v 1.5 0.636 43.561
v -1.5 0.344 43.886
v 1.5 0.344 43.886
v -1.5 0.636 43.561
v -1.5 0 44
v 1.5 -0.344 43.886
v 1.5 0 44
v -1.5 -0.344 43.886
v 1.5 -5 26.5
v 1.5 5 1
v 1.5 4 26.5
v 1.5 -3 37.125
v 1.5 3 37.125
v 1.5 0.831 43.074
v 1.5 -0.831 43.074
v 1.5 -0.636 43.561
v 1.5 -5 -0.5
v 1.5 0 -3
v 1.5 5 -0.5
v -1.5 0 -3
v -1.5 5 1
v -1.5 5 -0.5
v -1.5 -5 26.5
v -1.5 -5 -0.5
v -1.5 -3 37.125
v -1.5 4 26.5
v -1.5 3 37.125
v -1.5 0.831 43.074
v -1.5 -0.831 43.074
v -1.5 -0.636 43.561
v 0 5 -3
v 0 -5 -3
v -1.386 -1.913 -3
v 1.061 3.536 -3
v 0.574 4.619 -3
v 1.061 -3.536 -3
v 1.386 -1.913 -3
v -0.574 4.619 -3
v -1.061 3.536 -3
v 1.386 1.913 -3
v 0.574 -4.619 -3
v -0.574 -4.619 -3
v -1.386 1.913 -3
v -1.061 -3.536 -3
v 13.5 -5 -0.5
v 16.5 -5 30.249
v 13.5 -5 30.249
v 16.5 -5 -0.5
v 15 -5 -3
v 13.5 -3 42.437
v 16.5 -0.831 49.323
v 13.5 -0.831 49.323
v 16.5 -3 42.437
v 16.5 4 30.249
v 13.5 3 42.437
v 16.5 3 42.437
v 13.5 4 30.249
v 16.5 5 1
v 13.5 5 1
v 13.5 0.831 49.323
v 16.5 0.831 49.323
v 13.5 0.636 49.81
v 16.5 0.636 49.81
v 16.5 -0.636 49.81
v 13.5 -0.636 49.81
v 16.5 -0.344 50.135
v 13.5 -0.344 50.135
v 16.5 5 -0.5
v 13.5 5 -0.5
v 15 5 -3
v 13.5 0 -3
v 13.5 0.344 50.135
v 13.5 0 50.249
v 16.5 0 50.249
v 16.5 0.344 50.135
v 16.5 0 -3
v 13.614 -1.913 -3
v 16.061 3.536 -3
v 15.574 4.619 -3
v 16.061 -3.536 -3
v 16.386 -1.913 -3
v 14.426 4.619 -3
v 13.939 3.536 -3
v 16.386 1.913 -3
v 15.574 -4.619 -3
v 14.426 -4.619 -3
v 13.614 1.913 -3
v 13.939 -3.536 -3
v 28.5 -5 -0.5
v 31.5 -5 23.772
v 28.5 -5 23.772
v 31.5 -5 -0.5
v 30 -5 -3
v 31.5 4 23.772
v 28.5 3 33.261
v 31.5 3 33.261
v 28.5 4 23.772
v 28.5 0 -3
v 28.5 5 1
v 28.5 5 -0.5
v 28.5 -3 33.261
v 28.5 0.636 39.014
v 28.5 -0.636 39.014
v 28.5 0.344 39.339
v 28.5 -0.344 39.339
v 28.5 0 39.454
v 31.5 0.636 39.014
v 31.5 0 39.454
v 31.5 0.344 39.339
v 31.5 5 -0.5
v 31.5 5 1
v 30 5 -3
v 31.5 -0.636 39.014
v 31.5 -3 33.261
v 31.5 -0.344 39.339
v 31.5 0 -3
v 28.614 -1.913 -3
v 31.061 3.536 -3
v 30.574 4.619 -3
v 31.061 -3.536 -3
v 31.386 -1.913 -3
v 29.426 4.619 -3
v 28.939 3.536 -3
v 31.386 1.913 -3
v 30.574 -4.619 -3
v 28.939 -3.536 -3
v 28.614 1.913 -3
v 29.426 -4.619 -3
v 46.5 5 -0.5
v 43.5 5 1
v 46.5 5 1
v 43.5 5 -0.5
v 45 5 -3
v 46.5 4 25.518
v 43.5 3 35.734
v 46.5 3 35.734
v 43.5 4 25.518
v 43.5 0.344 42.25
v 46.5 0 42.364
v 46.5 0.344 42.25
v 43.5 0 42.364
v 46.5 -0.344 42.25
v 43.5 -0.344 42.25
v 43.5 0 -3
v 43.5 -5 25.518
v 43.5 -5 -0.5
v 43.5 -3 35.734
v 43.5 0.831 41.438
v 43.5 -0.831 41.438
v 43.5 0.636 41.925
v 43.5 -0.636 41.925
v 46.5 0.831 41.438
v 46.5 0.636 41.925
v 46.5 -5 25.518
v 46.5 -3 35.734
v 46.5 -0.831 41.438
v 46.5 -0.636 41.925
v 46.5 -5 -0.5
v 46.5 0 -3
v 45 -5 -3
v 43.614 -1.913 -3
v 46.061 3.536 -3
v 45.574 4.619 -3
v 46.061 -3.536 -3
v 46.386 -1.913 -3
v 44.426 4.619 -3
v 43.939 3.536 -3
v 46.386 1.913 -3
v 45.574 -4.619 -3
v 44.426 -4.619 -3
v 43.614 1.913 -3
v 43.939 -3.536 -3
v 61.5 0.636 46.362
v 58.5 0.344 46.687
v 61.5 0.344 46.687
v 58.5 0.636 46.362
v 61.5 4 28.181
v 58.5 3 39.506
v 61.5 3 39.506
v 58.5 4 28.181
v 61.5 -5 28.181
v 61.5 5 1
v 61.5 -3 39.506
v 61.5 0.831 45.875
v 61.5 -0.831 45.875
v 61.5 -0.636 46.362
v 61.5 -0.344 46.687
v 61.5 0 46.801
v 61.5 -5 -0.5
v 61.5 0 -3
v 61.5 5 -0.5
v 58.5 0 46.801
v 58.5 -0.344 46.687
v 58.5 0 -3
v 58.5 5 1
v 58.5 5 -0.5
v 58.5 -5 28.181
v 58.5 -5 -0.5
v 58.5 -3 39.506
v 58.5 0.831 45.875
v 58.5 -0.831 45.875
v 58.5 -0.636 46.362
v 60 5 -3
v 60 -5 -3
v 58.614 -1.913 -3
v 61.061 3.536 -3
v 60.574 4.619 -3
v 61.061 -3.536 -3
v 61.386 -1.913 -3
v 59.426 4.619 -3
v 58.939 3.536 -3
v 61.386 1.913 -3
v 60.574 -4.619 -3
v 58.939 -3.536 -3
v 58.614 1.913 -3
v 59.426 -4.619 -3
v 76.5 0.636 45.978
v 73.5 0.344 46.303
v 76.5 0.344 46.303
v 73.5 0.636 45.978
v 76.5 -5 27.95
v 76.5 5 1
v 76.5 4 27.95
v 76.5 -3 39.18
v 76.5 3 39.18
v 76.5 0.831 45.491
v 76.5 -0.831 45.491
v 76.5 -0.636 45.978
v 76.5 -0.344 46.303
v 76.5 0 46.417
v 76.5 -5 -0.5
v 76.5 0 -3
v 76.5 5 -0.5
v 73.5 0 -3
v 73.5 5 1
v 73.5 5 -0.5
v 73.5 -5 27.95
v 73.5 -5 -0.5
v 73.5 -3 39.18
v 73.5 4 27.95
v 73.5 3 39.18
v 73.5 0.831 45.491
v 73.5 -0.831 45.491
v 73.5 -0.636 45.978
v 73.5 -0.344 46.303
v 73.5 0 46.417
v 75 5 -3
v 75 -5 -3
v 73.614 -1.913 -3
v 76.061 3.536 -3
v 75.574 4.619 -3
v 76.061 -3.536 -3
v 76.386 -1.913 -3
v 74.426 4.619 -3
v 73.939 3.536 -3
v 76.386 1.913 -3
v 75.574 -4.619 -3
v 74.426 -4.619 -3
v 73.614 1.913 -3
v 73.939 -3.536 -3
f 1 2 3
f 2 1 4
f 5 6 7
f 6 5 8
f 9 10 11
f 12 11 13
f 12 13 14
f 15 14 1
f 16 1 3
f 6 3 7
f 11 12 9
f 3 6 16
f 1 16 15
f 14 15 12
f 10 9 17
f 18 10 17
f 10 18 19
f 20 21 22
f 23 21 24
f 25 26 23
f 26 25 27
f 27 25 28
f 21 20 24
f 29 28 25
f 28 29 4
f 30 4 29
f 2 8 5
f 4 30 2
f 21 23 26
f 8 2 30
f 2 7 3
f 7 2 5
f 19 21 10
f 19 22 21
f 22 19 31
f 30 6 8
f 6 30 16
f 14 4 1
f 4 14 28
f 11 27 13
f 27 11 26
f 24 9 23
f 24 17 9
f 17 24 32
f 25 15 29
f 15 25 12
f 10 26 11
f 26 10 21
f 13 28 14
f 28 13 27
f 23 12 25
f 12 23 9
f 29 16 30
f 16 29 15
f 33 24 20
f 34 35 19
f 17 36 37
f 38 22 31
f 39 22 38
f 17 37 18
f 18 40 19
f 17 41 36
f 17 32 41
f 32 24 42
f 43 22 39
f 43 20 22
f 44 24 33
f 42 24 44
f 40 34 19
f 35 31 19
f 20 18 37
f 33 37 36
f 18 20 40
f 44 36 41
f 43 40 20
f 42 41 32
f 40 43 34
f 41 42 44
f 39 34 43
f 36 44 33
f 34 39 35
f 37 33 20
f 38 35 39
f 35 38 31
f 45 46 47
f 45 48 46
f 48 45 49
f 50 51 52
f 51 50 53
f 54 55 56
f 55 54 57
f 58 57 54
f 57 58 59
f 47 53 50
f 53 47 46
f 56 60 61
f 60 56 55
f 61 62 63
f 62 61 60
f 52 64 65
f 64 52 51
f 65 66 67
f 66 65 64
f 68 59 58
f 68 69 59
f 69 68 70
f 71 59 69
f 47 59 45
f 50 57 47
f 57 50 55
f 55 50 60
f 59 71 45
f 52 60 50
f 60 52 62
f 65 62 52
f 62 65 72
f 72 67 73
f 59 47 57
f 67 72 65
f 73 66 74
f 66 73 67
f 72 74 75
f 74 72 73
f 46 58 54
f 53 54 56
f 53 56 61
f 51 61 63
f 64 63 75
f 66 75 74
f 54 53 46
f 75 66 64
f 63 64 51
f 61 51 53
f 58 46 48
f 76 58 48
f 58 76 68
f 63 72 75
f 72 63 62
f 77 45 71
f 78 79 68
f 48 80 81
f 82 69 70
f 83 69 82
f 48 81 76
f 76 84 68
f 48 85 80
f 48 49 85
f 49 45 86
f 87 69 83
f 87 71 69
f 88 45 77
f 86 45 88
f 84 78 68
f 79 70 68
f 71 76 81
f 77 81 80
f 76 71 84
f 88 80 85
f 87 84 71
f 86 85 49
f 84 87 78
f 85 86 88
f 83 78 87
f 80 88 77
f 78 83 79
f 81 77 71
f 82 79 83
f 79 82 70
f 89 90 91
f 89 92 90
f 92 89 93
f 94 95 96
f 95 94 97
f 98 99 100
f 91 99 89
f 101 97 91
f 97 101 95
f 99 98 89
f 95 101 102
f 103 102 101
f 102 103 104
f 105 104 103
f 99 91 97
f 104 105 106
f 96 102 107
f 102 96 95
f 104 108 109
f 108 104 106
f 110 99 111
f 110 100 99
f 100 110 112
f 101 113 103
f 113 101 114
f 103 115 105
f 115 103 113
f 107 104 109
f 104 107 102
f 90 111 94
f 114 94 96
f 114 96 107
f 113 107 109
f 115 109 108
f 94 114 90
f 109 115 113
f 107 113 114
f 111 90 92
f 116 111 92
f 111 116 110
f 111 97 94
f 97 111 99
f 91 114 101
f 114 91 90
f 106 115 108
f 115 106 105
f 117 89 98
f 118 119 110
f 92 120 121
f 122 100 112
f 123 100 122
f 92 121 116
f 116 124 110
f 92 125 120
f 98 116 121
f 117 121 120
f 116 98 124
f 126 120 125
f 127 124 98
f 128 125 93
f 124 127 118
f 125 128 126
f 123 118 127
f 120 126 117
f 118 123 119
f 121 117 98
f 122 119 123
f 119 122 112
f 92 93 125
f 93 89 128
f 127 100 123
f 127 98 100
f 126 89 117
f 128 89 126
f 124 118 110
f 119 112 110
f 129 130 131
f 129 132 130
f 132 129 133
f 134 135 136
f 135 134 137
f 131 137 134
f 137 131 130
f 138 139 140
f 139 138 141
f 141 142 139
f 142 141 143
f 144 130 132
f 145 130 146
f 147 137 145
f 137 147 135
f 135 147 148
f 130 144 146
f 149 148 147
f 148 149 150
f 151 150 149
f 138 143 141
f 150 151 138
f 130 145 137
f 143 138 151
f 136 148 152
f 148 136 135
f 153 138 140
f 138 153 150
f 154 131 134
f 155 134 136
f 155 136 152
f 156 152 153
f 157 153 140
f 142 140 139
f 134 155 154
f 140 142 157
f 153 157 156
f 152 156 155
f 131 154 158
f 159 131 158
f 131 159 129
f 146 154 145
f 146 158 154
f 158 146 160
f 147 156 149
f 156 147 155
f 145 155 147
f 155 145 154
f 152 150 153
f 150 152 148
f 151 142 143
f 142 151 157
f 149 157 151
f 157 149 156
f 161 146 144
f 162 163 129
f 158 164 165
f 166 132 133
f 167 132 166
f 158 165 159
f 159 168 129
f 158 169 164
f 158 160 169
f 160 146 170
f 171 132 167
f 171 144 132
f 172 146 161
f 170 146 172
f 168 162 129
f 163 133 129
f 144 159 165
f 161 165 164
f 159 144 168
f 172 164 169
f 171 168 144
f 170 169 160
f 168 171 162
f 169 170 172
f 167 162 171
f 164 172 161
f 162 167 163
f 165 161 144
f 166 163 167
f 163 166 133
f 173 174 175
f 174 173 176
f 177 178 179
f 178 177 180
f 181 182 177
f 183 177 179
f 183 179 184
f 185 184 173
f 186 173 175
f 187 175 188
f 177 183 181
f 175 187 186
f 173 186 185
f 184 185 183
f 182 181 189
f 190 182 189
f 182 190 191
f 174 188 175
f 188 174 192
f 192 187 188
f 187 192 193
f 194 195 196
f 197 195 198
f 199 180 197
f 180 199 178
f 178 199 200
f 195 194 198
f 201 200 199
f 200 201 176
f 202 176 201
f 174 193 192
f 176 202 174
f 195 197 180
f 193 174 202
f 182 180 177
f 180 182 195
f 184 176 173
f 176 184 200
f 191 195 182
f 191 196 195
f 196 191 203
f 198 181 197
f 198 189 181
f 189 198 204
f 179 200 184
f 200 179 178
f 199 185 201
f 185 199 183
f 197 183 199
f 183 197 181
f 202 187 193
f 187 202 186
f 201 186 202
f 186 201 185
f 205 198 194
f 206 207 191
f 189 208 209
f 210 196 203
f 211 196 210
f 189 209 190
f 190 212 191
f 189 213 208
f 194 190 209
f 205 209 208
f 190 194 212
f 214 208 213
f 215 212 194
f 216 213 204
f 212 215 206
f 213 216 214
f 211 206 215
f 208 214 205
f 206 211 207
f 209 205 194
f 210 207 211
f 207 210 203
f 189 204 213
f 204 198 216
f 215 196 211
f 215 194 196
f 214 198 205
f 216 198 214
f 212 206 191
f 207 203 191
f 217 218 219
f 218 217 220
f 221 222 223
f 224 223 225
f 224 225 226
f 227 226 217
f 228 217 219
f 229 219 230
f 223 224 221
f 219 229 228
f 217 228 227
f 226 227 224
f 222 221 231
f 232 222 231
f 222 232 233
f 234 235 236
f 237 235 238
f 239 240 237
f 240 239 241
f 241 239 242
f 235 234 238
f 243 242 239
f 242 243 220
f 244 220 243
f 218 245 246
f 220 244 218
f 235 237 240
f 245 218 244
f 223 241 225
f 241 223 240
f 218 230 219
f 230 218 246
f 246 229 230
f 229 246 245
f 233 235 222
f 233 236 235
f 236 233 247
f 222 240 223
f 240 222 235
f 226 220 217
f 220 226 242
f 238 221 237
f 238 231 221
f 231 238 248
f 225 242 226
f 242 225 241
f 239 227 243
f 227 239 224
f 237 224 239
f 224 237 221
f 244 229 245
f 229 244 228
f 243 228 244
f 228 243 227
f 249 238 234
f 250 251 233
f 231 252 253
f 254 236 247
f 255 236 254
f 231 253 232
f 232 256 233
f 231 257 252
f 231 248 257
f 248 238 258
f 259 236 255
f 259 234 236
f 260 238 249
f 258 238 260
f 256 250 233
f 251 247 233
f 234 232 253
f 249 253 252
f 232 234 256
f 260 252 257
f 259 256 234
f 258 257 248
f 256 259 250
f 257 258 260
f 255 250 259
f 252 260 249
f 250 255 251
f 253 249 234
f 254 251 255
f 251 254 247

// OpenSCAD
// file: ../common.scad
/*
 * WAVE OCEAN - Y-AXIS BARREL CAM SYSTEM
 * CORRECT GEOMETRY FOR TRAVELING WAVE
 *
 * COORDINATE SYSTEM:
 * - X: Along slat row (left-right) - WAVE TRAVELS THIS DIRECTION
 * - Y: Front-back (viewer at -Y) - CAM SHAFT AXIS
 * - Z: Up-down (gravity in -Z)
 *
 * KEY INSIGHT:
 * For a traveling wave, the cam shaft must be PERPENDICULAR to the slat row.
 * Shaft along Y-axis, slats along X-axis.
 * As cam rotates around Y, the helical ridge peak travels along X.
 *
 * All dimensions in mm
 */

// ============================================
// PRINT TOLERANCES
// ============================================

TOL_CLEARANCE = 0.2;
TOL_SLIDING = 0.3;

// ============================================
// HARDWARE
// ============================================

// 608 Bearing
BEARING_608_ID = 8;
BEARING_608_OD = 22;
BEARING_608_H = 7;

// Shaft (along Y-axis)
SHAFT_DIA = 8;
SHAFT_HOLE = SHAFT_DIA + TOL_CLEARANCE;

// ============================================
// SLAT CONFIGURATION
// ============================================

// Slat dimensions
SLAT_THICKNESS = 3;           // X dimension
SLAT_DEPTH = 10;              // Y dimension
SLAT_BASE_HEIGHT = 35;        // Z - minimum height
SLAT_HEIGHT_VAR = 15;         // Height variation

// Spacing
SLAT_SPACING = 5;             // Center-to-center along X
NUM_SLATS = 36;               // Per layer
SLAT_ROW_LENGTH = NUM_SLATS * SLAT_SPACING;  // 180mm

// Height variation using golden ratio
GOLDEN_ANGLE = 137.5077;
function slat_height(i) =
    let(
        primary = sin(i * GOLDEN_ANGLE),
        secondary = sin(i * GOLDEN_ANGLE * 0.618) * 0.4,
        combined = (primary + secondary + 1.4) / 2.8
    )
    SLAT_BASE_HEIGHT + SLAT_HEIGHT_VAR * combined;

// Slat X position (centered)
function slat_x(i) = (i - (NUM_SLATS - 1) / 2) * SLAT_SPACING;

// ============================================
// LAYER CONFIGURATION
// ============================================

NUM_LAYERS = 3;
LAYER_SPACING = 12;           // Y spacing between layers

// Layer Y positions (front to back)
LAYER_Y = [
    -LAYER_SPACING,           // Layer 0 (front): Y = -12
    0,                        // Layer 1 (mid):   Y = 0
    LAYER_SPACING             // Layer 2 (back):  Y = +12
];

// Ridge heights per layer (different amplitudes)
LAYER_RIDGE_HEIGHT = [4, 7, 10];  // Front=small, Mid=medium, Back=large

// Layer colors (front=dark, back=light for depth)
LAYER_COLORS = [
    [0.08, 0.25, 0.50],       // Dark blue (front)
    [0.15, 0.40, 0.65],       // Medium blue
    [0.25, 0.55, 0.80]        // Light blue (back)
];

// ============================================
// CAM CONFIGURATION
// ============================================

// Cam extends along X (same length as slat row)
CAM_LENGTH = SLAT_ROW_LENGTH;  // 180mm along X
CAM_CORE_RADIUS = 15;          // Minimum radius
CAM_WIDTH = 10;                // Y dimension of each cam section

// Helix: number of complete waves visible
HELIX_TURNS = 2;

// Maximum radius (core + largest ridge)
CAM_MAX_RADIUS = CAM_CORE_RADIUS + max(LAYER_RIDGE_HEIGHT);  // 25mm

// ============================================
// CAM SURFACE CALCULATION
// ============================================

// The key formula for traveling wave:
// At position X along cam, the phase depends on X.
// As cam rotates (theta increases), the "peak" of the wave travels along X.

function cam_surface_z(x, layer, theta) =
    let(
        // Helix angle at this X position
        helix_angle = (x / CAM_LENGTH + 0.5) * 360 * HELIX_TURNS,
        // Effective angle (theta - helix creates traveling effect)
        effective_angle = theta - helix_angle,
        // Ridge height for this layer
        ridge = LAYER_RIDGE_HEIGHT[layer],
        // Cam surface: cosine wave
        surface = CAM_CORE_RADIUS + ridge * (0.5 + 0.5 * cos(effective_angle))
    )
    surface;

// ============================================
// SLAT Z POSITION
// ============================================

FOLLOWER_HEIGHT = 3;          // Height of follower pad
CAM_CENTER_Z = 30;            // Height of cam shaft axis

function slat_z(i, layer, theta) =
    let(
        x = slat_x(i),
        cam_top = cam_surface_z(x, layer, theta)
    )
    CAM_CENTER_Z + cam_top + FOLLOWER_HEIGHT;

// ============================================
// ASSEMBLY POSITIONS
// ============================================

// Bearing mounts at front and back of cam stack
MOUNT_Y_FRONT = LAYER_Y[0] - CAM_WIDTH/2 - 15;   // ~-27
MOUNT_Y_BACK = LAYER_Y[2] + CAM_WIDTH/2 + 15;    // ~+27

// Shaft length
SHAFT_LENGTH = MOUNT_Y_BACK - MOUNT_Y_FRONT + 60;  // Extra for motor

// ============================================
// COLORS
// ============================================

C_CAM = [0.65, 0.5, 0.3];
C_SHAFT = [0.6, 0.6, 0.65];
C_MOUNT = [0.3, 0.3, 0.35];
C_FRAME = [0.25, 0.25, 0.28];

// ============================================
// QUALITY
// ============================================

$fn = 48;

// ============================================
// VERIFICATION OUTPUT
// ============================================

echo("============================================");
echo("  Y-AXIS BARREL CAM - TRAVELING WAVE");
echo("============================================");
echo("");
echo("GEOMETRY:");
echo(str("  Slat row along X: ", SLAT_ROW_LENGTH, "mm"));
echo(str("  Slats per layer: ", NUM_SLATS));
echo(str("  Layers: ", NUM_LAYERS, " at Y = ", LAYER_Y));
echo("");
echo("CAM:");
echo(str("  Shaft axis: Y (perpendicular to slat row)"));
echo(str("  Cam length: ", CAM_LENGTH, "mm along X"));
echo(str("  Core radius: ", CAM_CORE_RADIUS, "mm"));
echo(str("  Ridge heights: ", LAYER_RIDGE_HEIGHT, "mm"));
echo(str("  Helix turns: ", HELIX_TURNS, " = ", HELIX_TURNS, " waves visible"));
echo("");
echo("WAVE BEHAVIOR:");
echo("  As cam rotates around Y, the peak travels along X.");
echo("  This creates a TRUE traveling wave effect.");
// main file
/*
 * SLAT - Vertical Wave Element with Bottom Follower
 *
 * DESIGN:
 * - Thin vertical body
 * - Follower pad at bottom contacts cam surface
 * - Variable heights for organic wave look
 *
 * PRINT:
 * - Orientation: Upright
 * - Quantity: 36 per layer × 3 layers = 108 total
 */

include <../common.scad>

// ============================================
// SLAT MODULE
// ============================================

module slat(height = SLAT_BASE_HEIGHT) {
    union() {
        // Main wave body
        wave_body(height);

        // Cam follower at bottom
        cam_follower();
    }
}

// ============================================
// WAVE BODY
// ============================================

module wave_body(height) {
    // Tapered wave shape

    hull() {
        // Base - full size
        translate([-SLAT_THICKNESS/2, -SLAT_DEPTH/2, 0])
            cube([SLAT_THICKNESS, SLAT_DEPTH, 1]);

        // Mid section
        translate([-SLAT_THICKNESS/2, -SLAT_DEPTH/2, height * 0.6])
            cube([SLAT_THICKNESS, SLAT_DEPTH * 0.9, 1]);

        // Upper taper
        translate([-SLAT_THICKNESS/2, -SLAT_DEPTH * 0.3, height * 0.85])
            cube([SLAT_THICKNESS, SLAT_DEPTH * 0.6, 1]);

        // Rounded crest
        translate([0, 0, height])
        scale([1, 0.3, 0.5])
        rotate([0, 90, 0])
            cylinder(d = 6, h = SLAT_THICKNESS, center = true, $fn = 16);
    }
}

// ============================================
// CAM FOLLOWER
// ============================================

module cam_follower() {
    // Simple pad at bottom that rides on cam surface

    translate([0, 0, -FOLLOWER_HEIGHT])
    hull() {
        // Top of follower (connects to slat body)
        translate([-SLAT_THICKNESS/2, -SLAT_DEPTH/2, FOLLOWER_HEIGHT - 0.5])
            cube([SLAT_THICKNESS, SLAT_DEPTH, 0.5]);

        // Bottom of follower (contacts cam) - slightly rounded
        translate([0, 0, 0])
        scale([SLAT_THICKNESS/2, SLAT_DEPTH/2, 1])
            cylinder(r = 1, h = 0.5, $fn = 16);
    }
}

// ============================================
// RENDER - Sample slats showing height variation
// ============================================

for (i = [0 : 5]) {
    h = slat_height(i * 6);

    translate([i * 15, 0, 0])
    color(LAYER_COLORS[1])
        slat(h);
}

// ============================================
// INFO
// ============================================

echo("=== SLAT ===");
echo(str("Thickness (X): ", SLAT_THICKNESS, "mm"));
echo(str("Depth (Y): ", SLAT_DEPTH, "mm"));
echo(str("Height range: ", SLAT_BASE_HEIGHT, " - ", SLAT_BASE_HEIGHT + SLAT_HEIGHT_VAR, "mm"));
echo(str("Follower height: ", FOLLOWER_HEIGHT, "mm"));
echo("");
echo(str("Total slats: ", NUM_SLATS * NUM_LAYERS));
